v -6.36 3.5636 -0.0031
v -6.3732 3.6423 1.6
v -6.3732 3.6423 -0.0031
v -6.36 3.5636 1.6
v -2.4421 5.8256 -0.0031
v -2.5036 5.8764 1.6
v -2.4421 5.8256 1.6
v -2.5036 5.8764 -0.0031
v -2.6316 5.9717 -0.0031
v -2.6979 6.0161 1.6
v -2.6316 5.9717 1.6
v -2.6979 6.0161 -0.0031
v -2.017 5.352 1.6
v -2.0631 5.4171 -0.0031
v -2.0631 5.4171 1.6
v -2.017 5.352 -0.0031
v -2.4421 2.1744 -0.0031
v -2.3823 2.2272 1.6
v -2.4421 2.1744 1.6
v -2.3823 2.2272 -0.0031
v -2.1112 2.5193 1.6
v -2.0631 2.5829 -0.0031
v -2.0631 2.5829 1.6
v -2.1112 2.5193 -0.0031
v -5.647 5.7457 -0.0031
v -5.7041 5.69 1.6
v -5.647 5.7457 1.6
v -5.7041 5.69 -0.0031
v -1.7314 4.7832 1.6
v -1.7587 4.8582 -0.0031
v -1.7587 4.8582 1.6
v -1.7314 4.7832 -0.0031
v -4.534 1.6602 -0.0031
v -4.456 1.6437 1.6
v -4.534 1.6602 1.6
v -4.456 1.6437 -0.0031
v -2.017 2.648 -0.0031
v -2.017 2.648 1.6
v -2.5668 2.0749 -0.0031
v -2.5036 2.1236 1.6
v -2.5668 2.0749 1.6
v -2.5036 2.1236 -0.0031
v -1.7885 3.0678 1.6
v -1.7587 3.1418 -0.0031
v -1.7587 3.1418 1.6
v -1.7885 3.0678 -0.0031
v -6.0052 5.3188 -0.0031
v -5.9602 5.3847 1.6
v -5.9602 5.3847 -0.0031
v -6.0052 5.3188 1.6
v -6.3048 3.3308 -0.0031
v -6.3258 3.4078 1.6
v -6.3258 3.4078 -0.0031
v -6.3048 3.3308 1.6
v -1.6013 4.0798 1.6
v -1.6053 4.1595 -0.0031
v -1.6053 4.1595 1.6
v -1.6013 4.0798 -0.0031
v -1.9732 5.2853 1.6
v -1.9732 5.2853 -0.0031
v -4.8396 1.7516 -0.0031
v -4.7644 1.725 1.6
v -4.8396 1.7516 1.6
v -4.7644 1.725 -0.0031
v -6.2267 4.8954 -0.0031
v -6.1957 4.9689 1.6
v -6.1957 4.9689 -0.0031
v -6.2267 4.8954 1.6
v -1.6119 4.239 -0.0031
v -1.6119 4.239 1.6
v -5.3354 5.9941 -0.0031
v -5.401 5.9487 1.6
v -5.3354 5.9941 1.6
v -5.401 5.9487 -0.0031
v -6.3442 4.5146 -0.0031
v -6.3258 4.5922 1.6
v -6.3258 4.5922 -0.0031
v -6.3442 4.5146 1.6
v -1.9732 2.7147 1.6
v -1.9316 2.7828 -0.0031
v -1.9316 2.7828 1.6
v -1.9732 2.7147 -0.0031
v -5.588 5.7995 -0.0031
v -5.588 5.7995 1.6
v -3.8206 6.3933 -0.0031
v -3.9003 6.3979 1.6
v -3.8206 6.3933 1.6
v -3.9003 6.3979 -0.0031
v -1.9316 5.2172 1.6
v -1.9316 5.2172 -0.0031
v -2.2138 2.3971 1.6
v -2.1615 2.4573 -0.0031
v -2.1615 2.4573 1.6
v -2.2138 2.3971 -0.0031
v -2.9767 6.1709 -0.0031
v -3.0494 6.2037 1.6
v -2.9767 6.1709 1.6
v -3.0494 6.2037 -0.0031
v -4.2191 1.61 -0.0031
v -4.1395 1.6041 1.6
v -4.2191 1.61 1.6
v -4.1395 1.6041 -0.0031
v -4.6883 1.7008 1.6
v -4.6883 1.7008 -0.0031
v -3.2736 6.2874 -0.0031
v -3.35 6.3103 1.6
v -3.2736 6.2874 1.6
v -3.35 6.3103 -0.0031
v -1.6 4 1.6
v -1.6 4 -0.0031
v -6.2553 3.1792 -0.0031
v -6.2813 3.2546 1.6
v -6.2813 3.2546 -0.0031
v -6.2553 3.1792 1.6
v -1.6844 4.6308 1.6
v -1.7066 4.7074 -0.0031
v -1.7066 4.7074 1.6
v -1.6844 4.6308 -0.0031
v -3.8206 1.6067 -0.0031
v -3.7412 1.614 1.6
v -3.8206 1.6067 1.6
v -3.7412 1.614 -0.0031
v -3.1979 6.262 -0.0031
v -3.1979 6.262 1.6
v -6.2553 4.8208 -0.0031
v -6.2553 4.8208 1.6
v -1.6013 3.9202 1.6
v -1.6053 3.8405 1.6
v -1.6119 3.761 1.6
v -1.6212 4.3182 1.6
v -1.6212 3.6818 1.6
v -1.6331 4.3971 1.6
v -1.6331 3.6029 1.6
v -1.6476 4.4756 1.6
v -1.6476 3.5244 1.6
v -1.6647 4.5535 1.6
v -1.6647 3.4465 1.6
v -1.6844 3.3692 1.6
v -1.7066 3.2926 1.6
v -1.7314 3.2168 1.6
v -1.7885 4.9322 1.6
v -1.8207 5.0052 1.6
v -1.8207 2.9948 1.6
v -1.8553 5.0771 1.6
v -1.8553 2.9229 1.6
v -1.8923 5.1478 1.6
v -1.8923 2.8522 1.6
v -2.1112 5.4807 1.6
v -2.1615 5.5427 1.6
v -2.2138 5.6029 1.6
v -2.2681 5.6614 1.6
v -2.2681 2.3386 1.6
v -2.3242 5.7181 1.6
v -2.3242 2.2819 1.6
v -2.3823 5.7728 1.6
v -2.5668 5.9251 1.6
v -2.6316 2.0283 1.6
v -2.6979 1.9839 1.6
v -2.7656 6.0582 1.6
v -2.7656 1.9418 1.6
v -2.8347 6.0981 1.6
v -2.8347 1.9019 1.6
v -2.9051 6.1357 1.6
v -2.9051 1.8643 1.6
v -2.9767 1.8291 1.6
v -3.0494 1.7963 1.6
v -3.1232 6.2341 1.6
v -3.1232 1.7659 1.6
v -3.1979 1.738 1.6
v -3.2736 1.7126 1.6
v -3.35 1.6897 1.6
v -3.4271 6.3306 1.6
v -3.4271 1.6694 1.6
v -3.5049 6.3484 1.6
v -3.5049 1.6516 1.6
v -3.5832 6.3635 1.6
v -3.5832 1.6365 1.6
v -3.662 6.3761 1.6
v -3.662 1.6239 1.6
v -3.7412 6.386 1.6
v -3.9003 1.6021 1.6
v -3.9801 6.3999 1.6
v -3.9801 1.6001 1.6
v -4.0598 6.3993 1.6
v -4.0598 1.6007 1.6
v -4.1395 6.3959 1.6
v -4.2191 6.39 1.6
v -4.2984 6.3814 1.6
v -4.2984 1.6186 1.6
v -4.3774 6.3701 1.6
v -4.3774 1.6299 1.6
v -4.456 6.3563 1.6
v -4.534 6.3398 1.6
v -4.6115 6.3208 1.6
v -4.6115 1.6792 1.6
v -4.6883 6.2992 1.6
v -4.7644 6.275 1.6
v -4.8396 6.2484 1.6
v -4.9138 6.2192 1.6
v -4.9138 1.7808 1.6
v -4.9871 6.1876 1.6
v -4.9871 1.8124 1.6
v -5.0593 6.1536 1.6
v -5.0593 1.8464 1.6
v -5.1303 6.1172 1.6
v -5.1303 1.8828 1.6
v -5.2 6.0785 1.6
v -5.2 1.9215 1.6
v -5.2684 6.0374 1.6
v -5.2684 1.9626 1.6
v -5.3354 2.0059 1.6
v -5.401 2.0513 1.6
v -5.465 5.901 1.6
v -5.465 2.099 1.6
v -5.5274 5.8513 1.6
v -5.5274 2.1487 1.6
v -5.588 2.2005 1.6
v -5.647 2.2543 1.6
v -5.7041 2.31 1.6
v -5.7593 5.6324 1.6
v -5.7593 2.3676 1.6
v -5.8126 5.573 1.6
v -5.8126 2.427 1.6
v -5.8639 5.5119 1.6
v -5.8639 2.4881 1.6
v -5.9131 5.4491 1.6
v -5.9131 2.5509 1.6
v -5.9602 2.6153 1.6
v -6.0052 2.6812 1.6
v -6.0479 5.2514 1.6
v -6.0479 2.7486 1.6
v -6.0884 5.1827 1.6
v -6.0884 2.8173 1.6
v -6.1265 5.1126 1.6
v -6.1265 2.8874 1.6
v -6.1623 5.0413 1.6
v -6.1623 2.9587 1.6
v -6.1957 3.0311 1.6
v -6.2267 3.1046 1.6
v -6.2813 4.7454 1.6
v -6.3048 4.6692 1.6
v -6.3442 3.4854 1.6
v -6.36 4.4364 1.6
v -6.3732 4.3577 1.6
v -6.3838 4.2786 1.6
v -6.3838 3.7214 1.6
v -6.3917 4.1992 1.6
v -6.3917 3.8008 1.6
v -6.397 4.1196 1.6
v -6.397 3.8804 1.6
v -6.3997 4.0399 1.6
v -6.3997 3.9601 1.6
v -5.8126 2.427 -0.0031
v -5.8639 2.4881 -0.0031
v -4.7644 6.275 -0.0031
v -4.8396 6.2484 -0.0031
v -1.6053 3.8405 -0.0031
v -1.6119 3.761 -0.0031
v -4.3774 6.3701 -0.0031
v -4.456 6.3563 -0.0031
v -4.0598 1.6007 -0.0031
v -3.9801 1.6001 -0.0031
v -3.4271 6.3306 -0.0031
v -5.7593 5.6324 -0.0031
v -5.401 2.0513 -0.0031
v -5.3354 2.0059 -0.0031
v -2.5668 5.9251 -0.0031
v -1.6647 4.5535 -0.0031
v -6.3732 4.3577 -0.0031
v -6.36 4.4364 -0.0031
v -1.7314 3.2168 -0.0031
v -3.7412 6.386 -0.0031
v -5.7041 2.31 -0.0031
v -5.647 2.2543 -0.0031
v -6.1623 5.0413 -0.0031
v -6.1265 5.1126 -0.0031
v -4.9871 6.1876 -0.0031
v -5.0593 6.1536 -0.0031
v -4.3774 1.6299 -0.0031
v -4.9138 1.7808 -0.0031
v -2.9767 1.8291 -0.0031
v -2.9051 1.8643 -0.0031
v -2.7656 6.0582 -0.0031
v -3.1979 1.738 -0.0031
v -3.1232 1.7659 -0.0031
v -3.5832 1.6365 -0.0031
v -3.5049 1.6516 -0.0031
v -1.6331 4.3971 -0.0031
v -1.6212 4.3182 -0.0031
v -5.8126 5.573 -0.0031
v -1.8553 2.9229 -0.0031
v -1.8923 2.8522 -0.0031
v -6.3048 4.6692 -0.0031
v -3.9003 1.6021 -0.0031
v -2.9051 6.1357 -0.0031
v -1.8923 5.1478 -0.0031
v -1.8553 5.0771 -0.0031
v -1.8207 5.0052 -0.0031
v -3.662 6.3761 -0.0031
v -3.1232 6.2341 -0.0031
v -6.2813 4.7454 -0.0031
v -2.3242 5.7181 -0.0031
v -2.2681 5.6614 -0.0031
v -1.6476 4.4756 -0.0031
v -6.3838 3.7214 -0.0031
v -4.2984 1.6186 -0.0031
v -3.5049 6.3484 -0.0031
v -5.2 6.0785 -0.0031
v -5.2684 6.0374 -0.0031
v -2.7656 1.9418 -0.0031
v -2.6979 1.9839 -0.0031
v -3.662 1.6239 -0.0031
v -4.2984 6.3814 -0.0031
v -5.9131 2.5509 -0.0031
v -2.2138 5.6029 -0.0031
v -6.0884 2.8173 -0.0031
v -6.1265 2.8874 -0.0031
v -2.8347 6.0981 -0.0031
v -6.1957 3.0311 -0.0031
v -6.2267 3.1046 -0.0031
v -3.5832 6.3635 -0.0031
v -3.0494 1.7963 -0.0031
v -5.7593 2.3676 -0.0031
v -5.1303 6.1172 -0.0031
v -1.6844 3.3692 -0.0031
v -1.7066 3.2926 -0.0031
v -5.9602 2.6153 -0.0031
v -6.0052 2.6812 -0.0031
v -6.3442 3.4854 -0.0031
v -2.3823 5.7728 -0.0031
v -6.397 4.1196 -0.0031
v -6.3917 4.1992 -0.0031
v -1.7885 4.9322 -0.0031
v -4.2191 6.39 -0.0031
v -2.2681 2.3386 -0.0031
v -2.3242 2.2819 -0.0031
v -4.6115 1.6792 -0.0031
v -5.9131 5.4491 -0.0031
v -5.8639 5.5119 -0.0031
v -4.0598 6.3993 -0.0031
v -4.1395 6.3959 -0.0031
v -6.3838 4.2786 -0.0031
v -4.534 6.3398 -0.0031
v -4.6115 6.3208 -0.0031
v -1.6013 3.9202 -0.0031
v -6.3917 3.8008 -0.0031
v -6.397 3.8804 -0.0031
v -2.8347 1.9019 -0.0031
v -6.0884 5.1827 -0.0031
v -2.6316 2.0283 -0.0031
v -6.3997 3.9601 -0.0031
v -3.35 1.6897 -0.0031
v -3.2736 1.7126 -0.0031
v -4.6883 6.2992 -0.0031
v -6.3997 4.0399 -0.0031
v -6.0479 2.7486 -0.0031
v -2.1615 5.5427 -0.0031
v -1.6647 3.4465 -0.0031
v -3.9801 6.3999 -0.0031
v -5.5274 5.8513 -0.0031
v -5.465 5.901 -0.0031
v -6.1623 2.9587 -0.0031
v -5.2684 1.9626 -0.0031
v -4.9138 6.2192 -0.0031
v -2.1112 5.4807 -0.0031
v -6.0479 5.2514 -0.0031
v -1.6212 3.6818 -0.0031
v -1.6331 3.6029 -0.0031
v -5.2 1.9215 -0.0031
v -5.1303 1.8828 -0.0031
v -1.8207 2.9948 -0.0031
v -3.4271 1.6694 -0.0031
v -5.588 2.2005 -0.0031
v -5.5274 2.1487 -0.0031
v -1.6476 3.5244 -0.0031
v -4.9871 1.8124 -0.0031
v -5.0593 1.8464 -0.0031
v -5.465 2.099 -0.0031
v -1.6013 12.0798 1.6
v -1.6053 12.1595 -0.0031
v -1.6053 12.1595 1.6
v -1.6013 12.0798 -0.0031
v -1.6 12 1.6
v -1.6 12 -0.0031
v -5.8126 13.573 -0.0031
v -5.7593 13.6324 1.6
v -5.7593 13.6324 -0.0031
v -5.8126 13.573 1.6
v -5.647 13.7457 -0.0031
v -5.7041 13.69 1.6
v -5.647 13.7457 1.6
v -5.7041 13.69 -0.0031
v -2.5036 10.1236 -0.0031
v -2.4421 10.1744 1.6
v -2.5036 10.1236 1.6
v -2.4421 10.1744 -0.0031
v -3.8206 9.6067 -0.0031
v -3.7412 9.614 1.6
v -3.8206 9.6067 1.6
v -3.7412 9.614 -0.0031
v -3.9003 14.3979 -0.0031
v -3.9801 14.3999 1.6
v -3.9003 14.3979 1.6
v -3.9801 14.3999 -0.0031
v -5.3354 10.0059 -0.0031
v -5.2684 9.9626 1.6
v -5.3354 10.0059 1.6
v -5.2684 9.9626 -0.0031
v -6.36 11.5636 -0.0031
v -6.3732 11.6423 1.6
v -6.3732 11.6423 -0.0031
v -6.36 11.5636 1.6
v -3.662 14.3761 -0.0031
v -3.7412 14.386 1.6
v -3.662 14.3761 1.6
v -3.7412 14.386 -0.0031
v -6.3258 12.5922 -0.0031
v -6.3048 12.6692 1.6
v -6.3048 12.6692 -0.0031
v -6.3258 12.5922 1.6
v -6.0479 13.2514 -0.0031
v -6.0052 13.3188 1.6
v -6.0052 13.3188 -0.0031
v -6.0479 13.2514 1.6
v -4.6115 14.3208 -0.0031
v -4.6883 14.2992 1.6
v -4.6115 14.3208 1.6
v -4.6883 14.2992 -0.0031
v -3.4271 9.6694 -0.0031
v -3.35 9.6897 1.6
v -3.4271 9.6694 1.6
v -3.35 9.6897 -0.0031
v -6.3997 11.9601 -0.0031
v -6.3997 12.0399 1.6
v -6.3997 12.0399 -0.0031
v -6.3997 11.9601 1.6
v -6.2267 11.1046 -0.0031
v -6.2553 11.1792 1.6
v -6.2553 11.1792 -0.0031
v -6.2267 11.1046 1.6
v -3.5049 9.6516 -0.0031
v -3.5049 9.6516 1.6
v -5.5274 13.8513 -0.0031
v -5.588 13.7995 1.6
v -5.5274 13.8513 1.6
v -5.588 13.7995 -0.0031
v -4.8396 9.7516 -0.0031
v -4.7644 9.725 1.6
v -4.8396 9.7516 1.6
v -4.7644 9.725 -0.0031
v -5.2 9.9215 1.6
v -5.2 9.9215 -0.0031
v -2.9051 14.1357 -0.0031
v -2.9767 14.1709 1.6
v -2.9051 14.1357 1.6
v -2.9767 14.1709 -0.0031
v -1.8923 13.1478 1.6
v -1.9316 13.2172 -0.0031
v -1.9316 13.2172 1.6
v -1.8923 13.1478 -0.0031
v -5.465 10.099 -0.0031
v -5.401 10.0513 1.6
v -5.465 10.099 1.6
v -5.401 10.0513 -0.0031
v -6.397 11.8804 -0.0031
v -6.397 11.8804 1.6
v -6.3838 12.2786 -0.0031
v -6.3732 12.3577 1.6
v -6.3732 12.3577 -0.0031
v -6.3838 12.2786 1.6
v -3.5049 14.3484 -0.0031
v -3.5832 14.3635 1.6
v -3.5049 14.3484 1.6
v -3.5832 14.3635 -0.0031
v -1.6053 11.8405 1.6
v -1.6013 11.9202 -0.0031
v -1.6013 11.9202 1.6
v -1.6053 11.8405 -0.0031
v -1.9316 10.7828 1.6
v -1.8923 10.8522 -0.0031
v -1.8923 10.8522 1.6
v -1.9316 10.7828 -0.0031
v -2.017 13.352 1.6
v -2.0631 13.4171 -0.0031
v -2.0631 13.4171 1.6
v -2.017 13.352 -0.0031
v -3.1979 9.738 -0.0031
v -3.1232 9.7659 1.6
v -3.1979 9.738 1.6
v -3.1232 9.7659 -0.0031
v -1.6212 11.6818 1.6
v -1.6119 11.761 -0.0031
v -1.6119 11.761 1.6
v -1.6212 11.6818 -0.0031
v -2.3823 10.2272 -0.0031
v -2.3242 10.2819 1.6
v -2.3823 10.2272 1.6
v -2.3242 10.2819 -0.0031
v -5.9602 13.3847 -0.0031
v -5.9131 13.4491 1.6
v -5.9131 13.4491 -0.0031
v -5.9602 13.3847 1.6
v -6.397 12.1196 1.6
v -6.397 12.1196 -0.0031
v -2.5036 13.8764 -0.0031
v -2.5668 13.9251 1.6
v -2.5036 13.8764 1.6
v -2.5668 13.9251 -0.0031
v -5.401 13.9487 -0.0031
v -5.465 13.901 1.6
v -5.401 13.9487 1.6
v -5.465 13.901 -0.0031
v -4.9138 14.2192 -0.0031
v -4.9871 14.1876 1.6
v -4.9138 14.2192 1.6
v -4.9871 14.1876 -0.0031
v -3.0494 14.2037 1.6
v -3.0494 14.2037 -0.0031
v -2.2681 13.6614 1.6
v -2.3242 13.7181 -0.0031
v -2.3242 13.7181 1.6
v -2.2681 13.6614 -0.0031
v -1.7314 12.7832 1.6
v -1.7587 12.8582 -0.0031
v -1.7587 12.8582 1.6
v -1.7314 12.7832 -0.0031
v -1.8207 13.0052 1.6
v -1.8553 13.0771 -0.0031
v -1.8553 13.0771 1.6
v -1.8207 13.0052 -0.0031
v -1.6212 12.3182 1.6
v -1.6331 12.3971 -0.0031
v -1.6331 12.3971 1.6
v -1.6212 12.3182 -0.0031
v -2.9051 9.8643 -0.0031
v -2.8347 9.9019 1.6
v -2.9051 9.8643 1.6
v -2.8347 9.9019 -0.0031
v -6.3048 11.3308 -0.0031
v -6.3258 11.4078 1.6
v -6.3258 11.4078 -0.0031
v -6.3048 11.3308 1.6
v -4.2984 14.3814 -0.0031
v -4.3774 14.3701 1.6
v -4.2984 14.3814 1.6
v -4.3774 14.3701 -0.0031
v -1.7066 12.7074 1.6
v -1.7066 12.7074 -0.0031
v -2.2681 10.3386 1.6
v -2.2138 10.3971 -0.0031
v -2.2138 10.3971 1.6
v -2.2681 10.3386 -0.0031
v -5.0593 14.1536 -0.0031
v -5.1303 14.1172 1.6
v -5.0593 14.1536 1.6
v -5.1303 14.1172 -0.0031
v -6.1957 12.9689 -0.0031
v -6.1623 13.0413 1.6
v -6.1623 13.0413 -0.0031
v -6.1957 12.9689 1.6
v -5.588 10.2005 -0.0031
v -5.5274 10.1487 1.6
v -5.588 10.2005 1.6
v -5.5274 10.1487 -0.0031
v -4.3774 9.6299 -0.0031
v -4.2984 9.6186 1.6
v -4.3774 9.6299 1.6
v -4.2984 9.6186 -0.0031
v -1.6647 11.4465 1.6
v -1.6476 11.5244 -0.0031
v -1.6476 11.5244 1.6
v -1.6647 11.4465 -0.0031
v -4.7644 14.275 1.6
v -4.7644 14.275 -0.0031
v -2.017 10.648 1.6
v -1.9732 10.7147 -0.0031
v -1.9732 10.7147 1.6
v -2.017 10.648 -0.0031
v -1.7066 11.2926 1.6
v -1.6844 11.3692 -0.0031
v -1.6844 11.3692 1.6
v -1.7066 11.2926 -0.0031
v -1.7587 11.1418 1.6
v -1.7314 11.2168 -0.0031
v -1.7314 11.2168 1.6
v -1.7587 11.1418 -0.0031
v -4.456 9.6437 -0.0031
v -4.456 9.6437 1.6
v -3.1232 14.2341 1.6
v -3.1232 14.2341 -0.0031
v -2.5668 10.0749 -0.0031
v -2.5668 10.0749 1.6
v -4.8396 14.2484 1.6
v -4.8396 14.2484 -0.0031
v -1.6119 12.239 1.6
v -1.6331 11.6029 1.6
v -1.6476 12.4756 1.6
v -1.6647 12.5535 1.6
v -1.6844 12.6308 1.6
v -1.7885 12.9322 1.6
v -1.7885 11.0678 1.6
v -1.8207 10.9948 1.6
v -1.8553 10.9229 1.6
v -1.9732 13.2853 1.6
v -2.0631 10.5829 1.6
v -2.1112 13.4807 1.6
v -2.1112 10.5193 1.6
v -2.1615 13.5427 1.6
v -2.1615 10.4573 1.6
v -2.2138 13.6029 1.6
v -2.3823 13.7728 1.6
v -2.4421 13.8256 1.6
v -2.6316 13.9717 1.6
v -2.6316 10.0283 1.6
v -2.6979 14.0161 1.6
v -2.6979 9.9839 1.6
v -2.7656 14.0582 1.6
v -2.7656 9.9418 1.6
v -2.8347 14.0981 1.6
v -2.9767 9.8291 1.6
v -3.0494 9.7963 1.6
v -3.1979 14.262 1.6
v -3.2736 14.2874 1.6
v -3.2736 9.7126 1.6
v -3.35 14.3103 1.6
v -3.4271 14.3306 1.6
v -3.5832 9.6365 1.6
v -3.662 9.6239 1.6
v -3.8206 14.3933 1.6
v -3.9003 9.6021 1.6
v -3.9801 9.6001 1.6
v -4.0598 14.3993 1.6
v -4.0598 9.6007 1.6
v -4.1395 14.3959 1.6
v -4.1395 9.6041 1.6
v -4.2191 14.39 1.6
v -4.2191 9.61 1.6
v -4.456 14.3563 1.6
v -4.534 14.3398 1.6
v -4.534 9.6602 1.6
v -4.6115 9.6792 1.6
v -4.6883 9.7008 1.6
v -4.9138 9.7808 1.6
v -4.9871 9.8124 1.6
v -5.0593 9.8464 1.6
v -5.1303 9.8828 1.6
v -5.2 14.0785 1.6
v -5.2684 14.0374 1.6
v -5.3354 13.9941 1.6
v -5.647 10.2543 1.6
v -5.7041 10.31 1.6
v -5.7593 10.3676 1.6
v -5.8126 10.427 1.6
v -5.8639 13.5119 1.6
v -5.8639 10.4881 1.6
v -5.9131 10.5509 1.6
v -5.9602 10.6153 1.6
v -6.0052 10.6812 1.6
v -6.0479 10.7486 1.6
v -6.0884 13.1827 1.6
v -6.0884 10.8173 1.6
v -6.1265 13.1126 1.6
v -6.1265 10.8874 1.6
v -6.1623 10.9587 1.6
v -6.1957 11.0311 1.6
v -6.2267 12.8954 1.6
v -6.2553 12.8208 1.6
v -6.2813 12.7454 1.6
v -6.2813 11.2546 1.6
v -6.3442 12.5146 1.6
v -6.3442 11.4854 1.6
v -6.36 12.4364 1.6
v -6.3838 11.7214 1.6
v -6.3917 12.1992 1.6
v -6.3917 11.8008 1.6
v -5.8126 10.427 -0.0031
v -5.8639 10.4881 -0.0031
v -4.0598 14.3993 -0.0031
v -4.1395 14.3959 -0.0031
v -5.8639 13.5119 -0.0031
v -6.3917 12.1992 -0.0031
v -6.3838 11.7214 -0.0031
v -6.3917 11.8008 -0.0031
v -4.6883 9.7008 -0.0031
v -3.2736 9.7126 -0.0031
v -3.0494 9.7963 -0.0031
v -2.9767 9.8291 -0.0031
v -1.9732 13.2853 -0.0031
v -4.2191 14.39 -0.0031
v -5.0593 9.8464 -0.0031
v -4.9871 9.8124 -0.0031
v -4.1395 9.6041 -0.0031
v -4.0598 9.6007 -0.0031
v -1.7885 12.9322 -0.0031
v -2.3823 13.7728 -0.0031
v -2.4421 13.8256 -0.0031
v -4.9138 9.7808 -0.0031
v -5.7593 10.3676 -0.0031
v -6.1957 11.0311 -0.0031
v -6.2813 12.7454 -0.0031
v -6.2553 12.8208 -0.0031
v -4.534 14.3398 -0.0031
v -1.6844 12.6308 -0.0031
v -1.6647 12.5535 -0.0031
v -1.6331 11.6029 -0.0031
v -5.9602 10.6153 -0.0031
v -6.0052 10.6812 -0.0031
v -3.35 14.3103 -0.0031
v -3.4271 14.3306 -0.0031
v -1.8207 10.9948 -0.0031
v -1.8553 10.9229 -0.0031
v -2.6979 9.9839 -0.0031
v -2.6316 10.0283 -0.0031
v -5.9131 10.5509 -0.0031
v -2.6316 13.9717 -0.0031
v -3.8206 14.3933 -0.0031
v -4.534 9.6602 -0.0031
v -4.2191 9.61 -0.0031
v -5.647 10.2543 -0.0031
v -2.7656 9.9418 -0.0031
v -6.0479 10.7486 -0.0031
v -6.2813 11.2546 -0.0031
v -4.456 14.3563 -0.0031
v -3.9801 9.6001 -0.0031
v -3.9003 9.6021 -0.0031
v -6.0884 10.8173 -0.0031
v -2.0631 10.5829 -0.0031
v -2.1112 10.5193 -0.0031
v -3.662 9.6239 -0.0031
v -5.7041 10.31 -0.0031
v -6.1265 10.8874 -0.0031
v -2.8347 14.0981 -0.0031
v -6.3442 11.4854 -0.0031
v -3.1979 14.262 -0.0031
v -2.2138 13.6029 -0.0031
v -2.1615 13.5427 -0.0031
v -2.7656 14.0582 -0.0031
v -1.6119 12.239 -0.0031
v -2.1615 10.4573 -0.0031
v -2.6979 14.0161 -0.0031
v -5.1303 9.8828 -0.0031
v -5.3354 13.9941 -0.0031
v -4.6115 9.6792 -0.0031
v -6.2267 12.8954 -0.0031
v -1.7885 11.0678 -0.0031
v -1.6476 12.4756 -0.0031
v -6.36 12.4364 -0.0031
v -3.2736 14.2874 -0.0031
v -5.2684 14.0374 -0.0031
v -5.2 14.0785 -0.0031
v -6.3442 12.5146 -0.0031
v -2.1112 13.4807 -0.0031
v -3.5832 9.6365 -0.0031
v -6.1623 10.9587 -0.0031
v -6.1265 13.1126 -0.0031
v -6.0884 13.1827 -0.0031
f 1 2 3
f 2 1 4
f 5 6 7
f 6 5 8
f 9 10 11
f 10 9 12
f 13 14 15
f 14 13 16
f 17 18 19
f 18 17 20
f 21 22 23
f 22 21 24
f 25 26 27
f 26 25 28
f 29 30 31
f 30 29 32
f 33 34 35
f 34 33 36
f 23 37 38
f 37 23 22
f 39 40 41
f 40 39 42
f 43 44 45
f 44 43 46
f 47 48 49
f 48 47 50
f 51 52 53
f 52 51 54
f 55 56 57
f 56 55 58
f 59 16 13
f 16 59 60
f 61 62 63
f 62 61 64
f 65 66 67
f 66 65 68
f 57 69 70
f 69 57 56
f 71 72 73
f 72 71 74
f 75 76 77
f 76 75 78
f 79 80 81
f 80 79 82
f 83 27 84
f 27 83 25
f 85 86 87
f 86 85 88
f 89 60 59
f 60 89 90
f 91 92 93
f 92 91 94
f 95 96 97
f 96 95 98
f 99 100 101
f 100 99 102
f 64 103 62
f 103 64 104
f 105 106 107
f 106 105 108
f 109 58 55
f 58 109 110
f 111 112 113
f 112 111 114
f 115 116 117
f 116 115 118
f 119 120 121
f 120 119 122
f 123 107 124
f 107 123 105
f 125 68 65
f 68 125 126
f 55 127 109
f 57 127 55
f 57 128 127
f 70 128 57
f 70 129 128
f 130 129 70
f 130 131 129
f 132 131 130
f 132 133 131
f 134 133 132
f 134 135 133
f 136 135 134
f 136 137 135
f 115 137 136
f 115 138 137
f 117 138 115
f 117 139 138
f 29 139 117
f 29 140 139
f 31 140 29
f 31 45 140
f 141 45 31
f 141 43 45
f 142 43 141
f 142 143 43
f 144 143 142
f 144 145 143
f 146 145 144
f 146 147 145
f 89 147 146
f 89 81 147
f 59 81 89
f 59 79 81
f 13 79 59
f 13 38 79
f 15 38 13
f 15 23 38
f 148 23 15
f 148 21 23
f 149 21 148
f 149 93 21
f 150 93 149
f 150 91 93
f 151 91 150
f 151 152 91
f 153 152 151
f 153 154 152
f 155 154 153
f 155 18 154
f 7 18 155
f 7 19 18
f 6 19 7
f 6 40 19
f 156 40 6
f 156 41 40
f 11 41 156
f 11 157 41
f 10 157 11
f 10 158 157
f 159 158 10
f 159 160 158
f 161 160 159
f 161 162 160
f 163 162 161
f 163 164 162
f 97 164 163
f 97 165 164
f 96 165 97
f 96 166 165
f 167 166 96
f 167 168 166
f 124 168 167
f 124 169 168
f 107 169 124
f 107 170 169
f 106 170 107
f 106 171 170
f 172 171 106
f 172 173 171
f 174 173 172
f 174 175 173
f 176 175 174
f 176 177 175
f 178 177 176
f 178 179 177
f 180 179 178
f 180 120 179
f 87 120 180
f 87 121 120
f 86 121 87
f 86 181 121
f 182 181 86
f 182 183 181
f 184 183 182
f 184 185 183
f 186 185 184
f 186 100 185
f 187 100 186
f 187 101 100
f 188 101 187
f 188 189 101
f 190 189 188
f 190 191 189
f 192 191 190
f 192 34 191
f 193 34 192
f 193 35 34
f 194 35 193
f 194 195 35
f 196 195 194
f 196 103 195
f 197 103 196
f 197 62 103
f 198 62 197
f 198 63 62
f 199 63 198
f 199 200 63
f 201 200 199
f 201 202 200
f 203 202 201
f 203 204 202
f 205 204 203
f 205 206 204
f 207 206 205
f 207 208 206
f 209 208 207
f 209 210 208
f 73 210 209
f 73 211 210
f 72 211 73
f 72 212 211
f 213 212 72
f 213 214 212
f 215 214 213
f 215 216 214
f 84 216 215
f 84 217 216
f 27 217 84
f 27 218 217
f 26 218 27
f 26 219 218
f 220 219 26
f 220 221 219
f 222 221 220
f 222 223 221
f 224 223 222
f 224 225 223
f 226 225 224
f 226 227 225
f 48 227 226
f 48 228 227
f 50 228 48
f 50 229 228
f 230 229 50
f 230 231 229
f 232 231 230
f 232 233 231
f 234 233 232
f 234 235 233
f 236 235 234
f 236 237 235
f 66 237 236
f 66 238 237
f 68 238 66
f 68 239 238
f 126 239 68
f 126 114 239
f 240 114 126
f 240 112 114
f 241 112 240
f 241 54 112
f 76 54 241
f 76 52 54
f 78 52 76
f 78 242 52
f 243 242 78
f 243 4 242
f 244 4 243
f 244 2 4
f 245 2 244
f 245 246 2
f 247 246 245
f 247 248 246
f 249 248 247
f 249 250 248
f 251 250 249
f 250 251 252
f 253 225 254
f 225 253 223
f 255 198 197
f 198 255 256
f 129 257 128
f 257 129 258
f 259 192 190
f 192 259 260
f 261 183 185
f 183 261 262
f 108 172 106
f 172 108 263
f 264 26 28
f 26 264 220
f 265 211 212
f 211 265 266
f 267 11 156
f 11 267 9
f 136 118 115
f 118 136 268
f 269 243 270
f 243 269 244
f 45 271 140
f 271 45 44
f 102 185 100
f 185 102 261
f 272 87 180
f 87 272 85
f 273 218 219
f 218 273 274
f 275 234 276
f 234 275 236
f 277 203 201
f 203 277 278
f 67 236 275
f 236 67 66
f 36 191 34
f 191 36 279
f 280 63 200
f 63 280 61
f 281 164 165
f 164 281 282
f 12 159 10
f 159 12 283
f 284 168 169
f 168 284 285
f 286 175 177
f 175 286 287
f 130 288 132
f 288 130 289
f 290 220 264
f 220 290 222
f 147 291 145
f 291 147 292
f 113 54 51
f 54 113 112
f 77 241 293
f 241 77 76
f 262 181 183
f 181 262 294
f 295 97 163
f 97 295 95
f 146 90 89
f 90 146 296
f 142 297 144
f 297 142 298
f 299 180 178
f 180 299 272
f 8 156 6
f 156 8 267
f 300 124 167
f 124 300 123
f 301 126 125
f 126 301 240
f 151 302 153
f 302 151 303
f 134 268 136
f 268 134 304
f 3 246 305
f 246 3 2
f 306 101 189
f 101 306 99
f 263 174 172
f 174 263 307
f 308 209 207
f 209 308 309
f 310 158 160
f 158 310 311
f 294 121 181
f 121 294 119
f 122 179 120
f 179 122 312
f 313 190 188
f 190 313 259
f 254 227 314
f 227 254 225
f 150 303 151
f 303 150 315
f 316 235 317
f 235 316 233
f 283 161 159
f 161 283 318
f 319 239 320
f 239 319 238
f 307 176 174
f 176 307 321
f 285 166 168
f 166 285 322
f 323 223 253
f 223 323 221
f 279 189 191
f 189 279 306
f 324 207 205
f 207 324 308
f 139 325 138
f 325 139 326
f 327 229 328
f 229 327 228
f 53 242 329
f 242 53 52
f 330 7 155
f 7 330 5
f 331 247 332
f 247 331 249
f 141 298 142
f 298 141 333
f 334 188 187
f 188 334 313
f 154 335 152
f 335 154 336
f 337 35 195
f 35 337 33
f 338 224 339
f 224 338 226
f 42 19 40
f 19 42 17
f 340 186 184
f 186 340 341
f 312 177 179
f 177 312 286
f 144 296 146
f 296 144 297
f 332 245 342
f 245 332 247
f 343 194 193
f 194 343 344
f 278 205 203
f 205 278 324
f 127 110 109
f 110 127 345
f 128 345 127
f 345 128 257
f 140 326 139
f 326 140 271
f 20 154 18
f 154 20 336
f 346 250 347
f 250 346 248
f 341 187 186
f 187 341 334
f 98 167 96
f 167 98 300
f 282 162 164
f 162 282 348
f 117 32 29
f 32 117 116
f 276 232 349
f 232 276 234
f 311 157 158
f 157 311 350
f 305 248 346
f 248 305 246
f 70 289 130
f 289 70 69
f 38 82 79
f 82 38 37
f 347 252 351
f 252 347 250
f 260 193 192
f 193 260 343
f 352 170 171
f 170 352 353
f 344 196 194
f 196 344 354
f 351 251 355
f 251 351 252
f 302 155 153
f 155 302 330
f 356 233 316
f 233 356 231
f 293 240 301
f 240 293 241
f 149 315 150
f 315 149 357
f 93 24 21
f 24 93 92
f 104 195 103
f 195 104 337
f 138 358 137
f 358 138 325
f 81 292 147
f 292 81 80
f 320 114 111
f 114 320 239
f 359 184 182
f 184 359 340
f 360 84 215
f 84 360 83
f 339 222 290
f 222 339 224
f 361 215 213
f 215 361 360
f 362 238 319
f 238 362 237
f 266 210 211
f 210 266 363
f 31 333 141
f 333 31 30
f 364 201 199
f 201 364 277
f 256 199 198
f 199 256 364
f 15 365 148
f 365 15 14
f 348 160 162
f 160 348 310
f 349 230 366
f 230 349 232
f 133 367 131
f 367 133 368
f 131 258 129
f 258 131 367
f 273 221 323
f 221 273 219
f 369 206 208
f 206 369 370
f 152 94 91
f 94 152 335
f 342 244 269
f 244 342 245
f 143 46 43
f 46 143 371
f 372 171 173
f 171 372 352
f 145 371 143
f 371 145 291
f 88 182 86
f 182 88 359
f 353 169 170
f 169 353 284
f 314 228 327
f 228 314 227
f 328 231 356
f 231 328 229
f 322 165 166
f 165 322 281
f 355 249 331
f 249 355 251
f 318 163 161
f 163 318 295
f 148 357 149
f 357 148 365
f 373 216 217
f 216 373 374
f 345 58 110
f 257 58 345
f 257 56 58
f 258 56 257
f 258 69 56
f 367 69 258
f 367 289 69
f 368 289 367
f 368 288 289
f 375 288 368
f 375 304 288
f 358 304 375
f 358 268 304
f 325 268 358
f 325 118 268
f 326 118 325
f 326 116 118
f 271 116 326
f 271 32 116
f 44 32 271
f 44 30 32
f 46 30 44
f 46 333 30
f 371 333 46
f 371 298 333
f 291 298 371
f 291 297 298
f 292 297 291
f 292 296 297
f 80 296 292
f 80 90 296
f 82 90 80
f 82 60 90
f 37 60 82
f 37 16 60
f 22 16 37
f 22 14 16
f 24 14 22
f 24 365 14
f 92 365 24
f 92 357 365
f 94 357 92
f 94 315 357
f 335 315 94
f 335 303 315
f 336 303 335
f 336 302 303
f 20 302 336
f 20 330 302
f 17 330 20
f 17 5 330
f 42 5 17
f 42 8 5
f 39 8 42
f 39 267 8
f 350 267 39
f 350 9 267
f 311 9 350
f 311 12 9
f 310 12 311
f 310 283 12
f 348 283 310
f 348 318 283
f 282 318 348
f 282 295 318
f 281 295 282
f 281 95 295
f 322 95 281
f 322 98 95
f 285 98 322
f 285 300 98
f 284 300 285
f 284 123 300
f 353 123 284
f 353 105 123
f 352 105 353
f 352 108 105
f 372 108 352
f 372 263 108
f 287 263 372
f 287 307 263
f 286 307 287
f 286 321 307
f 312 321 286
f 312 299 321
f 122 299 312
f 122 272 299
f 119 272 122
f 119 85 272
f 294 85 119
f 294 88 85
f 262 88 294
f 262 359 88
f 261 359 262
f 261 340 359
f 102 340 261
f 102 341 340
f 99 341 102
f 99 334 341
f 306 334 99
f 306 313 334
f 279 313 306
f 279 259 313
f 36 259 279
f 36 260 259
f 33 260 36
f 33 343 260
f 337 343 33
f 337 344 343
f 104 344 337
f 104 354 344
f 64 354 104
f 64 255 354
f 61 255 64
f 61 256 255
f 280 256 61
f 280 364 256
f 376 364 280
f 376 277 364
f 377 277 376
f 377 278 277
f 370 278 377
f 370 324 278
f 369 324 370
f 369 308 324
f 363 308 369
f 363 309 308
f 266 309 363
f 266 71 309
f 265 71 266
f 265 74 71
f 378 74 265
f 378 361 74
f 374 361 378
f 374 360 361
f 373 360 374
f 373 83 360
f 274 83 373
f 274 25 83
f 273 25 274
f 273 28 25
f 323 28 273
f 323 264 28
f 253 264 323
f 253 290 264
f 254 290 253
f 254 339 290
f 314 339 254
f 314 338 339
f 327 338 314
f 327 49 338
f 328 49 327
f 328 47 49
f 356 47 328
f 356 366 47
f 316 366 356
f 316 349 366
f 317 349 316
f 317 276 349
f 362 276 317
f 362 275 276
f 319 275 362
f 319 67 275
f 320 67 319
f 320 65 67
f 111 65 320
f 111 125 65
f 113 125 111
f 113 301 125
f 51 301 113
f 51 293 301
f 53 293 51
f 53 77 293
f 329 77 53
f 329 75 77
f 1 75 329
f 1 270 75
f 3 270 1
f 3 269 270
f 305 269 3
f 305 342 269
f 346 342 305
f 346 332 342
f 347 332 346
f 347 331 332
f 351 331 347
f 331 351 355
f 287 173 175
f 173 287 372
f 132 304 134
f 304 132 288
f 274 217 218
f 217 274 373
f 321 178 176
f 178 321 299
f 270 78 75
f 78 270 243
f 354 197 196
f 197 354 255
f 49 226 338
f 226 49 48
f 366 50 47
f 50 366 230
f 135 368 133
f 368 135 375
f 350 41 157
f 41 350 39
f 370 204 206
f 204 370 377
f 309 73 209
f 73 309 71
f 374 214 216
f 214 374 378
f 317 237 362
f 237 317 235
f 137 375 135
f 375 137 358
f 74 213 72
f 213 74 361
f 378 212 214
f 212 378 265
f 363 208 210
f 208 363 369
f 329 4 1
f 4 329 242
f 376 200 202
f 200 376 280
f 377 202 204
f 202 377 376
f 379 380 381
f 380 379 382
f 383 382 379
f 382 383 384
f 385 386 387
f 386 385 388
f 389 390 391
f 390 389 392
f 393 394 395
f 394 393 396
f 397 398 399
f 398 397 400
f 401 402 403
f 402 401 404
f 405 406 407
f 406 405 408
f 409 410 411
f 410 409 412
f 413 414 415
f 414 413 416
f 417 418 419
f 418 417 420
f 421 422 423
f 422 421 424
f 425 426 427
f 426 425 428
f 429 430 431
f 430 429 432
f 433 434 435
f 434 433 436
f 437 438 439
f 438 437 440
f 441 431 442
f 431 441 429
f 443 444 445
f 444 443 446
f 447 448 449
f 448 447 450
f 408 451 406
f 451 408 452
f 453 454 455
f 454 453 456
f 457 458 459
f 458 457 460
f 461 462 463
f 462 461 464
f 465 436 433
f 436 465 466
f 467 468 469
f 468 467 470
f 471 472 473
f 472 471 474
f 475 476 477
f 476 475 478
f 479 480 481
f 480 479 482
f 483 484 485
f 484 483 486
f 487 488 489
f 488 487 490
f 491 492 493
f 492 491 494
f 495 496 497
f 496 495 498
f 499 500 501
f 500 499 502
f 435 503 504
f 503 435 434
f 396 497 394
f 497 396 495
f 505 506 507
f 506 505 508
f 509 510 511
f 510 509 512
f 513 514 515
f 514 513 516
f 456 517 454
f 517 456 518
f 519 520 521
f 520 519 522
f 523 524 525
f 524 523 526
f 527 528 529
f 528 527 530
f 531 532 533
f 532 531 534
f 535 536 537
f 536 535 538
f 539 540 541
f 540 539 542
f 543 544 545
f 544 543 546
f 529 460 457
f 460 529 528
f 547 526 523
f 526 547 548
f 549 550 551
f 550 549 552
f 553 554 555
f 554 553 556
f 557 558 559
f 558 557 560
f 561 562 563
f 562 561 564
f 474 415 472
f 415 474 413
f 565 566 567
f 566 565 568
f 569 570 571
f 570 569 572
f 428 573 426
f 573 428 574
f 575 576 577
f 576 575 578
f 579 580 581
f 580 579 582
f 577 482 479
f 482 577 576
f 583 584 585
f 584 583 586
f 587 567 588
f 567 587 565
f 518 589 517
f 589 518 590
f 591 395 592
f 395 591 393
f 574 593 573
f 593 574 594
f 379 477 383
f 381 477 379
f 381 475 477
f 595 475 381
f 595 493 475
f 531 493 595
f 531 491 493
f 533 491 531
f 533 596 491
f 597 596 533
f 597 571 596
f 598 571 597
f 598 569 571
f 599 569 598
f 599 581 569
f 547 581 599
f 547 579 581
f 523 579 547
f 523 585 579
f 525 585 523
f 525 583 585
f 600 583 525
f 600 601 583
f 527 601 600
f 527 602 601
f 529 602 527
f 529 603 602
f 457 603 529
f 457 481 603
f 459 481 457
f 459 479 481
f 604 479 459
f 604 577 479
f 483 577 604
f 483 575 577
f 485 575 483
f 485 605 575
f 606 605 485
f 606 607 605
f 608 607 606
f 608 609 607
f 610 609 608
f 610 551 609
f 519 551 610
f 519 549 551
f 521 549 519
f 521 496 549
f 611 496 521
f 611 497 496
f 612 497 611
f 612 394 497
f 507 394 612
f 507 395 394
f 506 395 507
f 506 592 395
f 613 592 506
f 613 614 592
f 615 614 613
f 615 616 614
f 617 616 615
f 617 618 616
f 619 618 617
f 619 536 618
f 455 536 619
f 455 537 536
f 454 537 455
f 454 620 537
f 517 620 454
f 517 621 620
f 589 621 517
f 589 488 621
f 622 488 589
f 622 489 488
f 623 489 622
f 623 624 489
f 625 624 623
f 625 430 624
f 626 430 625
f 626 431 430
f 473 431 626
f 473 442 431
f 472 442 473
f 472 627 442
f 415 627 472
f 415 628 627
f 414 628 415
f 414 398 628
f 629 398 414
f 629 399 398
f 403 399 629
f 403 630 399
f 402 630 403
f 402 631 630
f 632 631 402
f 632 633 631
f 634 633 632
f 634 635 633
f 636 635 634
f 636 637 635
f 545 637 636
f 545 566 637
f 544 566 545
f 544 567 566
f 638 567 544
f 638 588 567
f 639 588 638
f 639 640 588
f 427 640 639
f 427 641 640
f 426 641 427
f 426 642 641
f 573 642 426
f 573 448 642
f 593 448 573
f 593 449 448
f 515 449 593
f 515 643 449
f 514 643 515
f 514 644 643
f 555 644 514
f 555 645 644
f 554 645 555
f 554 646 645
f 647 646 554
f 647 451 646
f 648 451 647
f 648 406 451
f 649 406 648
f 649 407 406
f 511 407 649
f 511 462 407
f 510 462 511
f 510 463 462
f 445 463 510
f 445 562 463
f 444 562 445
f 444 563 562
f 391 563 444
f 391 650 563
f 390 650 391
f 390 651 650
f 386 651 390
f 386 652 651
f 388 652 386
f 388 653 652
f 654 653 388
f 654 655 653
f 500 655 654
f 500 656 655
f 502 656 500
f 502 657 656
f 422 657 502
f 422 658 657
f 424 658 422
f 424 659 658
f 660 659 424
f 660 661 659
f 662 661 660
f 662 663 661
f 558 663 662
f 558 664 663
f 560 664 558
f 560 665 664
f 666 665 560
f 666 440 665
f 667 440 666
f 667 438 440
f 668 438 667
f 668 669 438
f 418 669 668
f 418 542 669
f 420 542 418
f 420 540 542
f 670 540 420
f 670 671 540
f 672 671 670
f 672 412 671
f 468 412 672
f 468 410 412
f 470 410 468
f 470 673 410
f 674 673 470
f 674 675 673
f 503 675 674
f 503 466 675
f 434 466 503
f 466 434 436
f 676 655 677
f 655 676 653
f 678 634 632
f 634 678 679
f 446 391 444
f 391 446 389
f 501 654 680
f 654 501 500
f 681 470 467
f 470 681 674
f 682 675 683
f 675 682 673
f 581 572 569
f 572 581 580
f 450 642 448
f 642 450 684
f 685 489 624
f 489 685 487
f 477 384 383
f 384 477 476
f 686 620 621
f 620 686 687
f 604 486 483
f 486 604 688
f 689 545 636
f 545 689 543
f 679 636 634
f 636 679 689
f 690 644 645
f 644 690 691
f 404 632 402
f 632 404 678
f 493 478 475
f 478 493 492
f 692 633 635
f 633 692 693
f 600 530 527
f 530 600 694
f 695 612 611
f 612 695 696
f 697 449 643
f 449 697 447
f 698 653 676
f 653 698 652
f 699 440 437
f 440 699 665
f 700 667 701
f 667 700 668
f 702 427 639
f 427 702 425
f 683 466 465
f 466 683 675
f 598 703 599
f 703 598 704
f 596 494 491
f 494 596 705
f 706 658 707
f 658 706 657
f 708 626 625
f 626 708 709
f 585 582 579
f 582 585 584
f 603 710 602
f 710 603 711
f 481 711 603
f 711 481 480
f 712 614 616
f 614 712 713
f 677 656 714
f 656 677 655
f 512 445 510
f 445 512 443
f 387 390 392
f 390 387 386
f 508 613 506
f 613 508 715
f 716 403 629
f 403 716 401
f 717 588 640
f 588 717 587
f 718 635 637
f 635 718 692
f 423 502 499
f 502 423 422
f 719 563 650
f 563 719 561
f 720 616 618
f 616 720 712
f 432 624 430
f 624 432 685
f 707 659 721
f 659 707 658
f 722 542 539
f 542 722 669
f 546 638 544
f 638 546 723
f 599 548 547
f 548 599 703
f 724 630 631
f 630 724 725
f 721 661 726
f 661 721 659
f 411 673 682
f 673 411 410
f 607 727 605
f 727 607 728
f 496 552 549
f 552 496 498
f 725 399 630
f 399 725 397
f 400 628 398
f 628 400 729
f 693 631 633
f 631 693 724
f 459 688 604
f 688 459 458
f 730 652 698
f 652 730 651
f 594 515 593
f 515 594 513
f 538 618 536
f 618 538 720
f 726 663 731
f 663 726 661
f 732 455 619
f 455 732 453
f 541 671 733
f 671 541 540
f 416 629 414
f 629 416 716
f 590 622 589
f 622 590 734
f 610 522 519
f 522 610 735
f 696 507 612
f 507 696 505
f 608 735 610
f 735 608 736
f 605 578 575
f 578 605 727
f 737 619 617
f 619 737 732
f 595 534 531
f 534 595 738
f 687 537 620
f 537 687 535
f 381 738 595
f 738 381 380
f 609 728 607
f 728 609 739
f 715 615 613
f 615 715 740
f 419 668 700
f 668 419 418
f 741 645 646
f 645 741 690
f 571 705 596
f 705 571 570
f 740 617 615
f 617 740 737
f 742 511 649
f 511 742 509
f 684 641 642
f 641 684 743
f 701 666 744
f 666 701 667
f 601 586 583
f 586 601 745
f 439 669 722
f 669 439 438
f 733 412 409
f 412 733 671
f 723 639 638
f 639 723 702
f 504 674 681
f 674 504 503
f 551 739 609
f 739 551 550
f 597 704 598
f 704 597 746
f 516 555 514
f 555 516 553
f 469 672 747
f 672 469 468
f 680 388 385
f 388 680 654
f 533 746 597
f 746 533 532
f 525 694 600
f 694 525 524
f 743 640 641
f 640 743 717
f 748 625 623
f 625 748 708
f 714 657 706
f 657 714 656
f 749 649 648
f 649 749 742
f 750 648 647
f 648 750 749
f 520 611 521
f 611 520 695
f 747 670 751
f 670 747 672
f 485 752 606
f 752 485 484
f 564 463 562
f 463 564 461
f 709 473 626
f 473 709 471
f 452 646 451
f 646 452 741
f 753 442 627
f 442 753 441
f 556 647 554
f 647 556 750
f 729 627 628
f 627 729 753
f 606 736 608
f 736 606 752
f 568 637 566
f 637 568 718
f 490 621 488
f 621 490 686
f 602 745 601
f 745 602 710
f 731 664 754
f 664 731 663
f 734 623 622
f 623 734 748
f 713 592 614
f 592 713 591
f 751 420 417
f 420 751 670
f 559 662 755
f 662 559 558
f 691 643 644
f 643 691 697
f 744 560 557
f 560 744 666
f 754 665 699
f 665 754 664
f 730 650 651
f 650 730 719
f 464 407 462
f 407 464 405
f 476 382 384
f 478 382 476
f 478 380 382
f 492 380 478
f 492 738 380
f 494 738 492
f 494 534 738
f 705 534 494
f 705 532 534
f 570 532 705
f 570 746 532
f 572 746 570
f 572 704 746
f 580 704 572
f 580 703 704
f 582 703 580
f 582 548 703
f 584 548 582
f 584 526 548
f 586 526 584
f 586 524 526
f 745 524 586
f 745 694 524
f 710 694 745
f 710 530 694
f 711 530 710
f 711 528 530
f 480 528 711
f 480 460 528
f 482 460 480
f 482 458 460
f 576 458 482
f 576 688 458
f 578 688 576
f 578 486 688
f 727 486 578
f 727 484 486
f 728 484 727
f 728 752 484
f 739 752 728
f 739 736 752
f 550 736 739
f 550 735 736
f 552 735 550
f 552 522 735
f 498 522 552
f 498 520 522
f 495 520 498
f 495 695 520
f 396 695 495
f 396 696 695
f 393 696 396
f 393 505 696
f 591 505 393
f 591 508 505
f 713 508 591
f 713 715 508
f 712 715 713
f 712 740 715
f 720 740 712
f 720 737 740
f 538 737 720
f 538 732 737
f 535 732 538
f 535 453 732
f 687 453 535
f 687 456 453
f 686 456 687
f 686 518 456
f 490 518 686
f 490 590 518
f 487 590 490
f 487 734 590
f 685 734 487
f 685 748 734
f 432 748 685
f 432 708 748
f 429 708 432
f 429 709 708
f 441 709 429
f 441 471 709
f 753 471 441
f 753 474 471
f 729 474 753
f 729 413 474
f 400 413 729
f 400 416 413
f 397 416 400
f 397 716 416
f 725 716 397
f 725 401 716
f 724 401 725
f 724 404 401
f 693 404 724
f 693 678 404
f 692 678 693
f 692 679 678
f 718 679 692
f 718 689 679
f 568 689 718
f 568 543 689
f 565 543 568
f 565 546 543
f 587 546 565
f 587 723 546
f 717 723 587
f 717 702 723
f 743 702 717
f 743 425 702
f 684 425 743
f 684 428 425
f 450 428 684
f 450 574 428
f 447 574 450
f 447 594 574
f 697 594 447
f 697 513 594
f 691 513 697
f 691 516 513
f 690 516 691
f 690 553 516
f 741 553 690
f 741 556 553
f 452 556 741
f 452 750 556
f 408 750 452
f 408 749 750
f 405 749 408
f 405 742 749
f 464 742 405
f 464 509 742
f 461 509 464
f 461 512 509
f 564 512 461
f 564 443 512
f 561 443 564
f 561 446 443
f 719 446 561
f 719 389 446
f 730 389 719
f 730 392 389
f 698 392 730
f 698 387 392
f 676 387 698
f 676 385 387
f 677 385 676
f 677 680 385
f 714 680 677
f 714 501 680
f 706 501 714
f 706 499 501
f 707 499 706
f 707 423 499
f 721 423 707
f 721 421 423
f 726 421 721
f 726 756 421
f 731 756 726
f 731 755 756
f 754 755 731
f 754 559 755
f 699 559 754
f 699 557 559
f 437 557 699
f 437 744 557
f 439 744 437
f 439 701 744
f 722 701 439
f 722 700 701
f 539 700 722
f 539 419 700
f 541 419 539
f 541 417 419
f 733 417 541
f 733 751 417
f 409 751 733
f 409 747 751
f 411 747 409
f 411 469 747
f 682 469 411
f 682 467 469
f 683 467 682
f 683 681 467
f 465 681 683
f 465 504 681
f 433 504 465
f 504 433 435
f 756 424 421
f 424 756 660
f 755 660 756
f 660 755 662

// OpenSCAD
use <../lib.scad>
use <s/65429s01.scad>
use <../p/stug-1x2.scad>
$fa=1; $fs=0.2;
function ldraw_lib__65429(realsolid=false) = [
// 0 Wing  2 x  4 Left with Truncated Tip
// 0 Name: 65429.dat
// 0 Author: Gerald Lasser [GeraldLasser]
// 0 !LDRAW_ORG Part UPDATE 2020-02
// 0 !LICENSE Licensed under CC BY 2.0 and CC BY 4.0 : see CAreadme.txt
// 
// 0 BFC CERTIFY CCW
  [0,"BFC","CERTIFY"],
  [0,"BFC","CCW"],
// 
// 0 !HISTORY 2020-09-05 [PTadmin] Official Update 2020-02
// 
// 
// 1 16 0 0 0 1 0 0 0 1 0 0 0 1 s\65429s01.dat
  [1,16,0,0,0,1,0,0,0,1,0,0,0,1, ldraw_lib__s__65429s01(realsolid)],
// 1 16 -10 0 20 0 0 -1 0 1 0 1 0 0 stug-1x2.dat
  [1,16,-10,0,20,0,0,-1,0,1,0,1,0,0, ldraw_lib__stug_1x2(realsolid)],
];
module ldraw_lib__65429(step=0, col=false, unit=2/5, alt=false, line=0.2, solid=!$preview)
    makepoly(ldraw_lib__65429(solid), step=step, col=col, unit=unit, alt=alt, line=line, solid=solid);
ldraw_lib__65429(line=0.2);
